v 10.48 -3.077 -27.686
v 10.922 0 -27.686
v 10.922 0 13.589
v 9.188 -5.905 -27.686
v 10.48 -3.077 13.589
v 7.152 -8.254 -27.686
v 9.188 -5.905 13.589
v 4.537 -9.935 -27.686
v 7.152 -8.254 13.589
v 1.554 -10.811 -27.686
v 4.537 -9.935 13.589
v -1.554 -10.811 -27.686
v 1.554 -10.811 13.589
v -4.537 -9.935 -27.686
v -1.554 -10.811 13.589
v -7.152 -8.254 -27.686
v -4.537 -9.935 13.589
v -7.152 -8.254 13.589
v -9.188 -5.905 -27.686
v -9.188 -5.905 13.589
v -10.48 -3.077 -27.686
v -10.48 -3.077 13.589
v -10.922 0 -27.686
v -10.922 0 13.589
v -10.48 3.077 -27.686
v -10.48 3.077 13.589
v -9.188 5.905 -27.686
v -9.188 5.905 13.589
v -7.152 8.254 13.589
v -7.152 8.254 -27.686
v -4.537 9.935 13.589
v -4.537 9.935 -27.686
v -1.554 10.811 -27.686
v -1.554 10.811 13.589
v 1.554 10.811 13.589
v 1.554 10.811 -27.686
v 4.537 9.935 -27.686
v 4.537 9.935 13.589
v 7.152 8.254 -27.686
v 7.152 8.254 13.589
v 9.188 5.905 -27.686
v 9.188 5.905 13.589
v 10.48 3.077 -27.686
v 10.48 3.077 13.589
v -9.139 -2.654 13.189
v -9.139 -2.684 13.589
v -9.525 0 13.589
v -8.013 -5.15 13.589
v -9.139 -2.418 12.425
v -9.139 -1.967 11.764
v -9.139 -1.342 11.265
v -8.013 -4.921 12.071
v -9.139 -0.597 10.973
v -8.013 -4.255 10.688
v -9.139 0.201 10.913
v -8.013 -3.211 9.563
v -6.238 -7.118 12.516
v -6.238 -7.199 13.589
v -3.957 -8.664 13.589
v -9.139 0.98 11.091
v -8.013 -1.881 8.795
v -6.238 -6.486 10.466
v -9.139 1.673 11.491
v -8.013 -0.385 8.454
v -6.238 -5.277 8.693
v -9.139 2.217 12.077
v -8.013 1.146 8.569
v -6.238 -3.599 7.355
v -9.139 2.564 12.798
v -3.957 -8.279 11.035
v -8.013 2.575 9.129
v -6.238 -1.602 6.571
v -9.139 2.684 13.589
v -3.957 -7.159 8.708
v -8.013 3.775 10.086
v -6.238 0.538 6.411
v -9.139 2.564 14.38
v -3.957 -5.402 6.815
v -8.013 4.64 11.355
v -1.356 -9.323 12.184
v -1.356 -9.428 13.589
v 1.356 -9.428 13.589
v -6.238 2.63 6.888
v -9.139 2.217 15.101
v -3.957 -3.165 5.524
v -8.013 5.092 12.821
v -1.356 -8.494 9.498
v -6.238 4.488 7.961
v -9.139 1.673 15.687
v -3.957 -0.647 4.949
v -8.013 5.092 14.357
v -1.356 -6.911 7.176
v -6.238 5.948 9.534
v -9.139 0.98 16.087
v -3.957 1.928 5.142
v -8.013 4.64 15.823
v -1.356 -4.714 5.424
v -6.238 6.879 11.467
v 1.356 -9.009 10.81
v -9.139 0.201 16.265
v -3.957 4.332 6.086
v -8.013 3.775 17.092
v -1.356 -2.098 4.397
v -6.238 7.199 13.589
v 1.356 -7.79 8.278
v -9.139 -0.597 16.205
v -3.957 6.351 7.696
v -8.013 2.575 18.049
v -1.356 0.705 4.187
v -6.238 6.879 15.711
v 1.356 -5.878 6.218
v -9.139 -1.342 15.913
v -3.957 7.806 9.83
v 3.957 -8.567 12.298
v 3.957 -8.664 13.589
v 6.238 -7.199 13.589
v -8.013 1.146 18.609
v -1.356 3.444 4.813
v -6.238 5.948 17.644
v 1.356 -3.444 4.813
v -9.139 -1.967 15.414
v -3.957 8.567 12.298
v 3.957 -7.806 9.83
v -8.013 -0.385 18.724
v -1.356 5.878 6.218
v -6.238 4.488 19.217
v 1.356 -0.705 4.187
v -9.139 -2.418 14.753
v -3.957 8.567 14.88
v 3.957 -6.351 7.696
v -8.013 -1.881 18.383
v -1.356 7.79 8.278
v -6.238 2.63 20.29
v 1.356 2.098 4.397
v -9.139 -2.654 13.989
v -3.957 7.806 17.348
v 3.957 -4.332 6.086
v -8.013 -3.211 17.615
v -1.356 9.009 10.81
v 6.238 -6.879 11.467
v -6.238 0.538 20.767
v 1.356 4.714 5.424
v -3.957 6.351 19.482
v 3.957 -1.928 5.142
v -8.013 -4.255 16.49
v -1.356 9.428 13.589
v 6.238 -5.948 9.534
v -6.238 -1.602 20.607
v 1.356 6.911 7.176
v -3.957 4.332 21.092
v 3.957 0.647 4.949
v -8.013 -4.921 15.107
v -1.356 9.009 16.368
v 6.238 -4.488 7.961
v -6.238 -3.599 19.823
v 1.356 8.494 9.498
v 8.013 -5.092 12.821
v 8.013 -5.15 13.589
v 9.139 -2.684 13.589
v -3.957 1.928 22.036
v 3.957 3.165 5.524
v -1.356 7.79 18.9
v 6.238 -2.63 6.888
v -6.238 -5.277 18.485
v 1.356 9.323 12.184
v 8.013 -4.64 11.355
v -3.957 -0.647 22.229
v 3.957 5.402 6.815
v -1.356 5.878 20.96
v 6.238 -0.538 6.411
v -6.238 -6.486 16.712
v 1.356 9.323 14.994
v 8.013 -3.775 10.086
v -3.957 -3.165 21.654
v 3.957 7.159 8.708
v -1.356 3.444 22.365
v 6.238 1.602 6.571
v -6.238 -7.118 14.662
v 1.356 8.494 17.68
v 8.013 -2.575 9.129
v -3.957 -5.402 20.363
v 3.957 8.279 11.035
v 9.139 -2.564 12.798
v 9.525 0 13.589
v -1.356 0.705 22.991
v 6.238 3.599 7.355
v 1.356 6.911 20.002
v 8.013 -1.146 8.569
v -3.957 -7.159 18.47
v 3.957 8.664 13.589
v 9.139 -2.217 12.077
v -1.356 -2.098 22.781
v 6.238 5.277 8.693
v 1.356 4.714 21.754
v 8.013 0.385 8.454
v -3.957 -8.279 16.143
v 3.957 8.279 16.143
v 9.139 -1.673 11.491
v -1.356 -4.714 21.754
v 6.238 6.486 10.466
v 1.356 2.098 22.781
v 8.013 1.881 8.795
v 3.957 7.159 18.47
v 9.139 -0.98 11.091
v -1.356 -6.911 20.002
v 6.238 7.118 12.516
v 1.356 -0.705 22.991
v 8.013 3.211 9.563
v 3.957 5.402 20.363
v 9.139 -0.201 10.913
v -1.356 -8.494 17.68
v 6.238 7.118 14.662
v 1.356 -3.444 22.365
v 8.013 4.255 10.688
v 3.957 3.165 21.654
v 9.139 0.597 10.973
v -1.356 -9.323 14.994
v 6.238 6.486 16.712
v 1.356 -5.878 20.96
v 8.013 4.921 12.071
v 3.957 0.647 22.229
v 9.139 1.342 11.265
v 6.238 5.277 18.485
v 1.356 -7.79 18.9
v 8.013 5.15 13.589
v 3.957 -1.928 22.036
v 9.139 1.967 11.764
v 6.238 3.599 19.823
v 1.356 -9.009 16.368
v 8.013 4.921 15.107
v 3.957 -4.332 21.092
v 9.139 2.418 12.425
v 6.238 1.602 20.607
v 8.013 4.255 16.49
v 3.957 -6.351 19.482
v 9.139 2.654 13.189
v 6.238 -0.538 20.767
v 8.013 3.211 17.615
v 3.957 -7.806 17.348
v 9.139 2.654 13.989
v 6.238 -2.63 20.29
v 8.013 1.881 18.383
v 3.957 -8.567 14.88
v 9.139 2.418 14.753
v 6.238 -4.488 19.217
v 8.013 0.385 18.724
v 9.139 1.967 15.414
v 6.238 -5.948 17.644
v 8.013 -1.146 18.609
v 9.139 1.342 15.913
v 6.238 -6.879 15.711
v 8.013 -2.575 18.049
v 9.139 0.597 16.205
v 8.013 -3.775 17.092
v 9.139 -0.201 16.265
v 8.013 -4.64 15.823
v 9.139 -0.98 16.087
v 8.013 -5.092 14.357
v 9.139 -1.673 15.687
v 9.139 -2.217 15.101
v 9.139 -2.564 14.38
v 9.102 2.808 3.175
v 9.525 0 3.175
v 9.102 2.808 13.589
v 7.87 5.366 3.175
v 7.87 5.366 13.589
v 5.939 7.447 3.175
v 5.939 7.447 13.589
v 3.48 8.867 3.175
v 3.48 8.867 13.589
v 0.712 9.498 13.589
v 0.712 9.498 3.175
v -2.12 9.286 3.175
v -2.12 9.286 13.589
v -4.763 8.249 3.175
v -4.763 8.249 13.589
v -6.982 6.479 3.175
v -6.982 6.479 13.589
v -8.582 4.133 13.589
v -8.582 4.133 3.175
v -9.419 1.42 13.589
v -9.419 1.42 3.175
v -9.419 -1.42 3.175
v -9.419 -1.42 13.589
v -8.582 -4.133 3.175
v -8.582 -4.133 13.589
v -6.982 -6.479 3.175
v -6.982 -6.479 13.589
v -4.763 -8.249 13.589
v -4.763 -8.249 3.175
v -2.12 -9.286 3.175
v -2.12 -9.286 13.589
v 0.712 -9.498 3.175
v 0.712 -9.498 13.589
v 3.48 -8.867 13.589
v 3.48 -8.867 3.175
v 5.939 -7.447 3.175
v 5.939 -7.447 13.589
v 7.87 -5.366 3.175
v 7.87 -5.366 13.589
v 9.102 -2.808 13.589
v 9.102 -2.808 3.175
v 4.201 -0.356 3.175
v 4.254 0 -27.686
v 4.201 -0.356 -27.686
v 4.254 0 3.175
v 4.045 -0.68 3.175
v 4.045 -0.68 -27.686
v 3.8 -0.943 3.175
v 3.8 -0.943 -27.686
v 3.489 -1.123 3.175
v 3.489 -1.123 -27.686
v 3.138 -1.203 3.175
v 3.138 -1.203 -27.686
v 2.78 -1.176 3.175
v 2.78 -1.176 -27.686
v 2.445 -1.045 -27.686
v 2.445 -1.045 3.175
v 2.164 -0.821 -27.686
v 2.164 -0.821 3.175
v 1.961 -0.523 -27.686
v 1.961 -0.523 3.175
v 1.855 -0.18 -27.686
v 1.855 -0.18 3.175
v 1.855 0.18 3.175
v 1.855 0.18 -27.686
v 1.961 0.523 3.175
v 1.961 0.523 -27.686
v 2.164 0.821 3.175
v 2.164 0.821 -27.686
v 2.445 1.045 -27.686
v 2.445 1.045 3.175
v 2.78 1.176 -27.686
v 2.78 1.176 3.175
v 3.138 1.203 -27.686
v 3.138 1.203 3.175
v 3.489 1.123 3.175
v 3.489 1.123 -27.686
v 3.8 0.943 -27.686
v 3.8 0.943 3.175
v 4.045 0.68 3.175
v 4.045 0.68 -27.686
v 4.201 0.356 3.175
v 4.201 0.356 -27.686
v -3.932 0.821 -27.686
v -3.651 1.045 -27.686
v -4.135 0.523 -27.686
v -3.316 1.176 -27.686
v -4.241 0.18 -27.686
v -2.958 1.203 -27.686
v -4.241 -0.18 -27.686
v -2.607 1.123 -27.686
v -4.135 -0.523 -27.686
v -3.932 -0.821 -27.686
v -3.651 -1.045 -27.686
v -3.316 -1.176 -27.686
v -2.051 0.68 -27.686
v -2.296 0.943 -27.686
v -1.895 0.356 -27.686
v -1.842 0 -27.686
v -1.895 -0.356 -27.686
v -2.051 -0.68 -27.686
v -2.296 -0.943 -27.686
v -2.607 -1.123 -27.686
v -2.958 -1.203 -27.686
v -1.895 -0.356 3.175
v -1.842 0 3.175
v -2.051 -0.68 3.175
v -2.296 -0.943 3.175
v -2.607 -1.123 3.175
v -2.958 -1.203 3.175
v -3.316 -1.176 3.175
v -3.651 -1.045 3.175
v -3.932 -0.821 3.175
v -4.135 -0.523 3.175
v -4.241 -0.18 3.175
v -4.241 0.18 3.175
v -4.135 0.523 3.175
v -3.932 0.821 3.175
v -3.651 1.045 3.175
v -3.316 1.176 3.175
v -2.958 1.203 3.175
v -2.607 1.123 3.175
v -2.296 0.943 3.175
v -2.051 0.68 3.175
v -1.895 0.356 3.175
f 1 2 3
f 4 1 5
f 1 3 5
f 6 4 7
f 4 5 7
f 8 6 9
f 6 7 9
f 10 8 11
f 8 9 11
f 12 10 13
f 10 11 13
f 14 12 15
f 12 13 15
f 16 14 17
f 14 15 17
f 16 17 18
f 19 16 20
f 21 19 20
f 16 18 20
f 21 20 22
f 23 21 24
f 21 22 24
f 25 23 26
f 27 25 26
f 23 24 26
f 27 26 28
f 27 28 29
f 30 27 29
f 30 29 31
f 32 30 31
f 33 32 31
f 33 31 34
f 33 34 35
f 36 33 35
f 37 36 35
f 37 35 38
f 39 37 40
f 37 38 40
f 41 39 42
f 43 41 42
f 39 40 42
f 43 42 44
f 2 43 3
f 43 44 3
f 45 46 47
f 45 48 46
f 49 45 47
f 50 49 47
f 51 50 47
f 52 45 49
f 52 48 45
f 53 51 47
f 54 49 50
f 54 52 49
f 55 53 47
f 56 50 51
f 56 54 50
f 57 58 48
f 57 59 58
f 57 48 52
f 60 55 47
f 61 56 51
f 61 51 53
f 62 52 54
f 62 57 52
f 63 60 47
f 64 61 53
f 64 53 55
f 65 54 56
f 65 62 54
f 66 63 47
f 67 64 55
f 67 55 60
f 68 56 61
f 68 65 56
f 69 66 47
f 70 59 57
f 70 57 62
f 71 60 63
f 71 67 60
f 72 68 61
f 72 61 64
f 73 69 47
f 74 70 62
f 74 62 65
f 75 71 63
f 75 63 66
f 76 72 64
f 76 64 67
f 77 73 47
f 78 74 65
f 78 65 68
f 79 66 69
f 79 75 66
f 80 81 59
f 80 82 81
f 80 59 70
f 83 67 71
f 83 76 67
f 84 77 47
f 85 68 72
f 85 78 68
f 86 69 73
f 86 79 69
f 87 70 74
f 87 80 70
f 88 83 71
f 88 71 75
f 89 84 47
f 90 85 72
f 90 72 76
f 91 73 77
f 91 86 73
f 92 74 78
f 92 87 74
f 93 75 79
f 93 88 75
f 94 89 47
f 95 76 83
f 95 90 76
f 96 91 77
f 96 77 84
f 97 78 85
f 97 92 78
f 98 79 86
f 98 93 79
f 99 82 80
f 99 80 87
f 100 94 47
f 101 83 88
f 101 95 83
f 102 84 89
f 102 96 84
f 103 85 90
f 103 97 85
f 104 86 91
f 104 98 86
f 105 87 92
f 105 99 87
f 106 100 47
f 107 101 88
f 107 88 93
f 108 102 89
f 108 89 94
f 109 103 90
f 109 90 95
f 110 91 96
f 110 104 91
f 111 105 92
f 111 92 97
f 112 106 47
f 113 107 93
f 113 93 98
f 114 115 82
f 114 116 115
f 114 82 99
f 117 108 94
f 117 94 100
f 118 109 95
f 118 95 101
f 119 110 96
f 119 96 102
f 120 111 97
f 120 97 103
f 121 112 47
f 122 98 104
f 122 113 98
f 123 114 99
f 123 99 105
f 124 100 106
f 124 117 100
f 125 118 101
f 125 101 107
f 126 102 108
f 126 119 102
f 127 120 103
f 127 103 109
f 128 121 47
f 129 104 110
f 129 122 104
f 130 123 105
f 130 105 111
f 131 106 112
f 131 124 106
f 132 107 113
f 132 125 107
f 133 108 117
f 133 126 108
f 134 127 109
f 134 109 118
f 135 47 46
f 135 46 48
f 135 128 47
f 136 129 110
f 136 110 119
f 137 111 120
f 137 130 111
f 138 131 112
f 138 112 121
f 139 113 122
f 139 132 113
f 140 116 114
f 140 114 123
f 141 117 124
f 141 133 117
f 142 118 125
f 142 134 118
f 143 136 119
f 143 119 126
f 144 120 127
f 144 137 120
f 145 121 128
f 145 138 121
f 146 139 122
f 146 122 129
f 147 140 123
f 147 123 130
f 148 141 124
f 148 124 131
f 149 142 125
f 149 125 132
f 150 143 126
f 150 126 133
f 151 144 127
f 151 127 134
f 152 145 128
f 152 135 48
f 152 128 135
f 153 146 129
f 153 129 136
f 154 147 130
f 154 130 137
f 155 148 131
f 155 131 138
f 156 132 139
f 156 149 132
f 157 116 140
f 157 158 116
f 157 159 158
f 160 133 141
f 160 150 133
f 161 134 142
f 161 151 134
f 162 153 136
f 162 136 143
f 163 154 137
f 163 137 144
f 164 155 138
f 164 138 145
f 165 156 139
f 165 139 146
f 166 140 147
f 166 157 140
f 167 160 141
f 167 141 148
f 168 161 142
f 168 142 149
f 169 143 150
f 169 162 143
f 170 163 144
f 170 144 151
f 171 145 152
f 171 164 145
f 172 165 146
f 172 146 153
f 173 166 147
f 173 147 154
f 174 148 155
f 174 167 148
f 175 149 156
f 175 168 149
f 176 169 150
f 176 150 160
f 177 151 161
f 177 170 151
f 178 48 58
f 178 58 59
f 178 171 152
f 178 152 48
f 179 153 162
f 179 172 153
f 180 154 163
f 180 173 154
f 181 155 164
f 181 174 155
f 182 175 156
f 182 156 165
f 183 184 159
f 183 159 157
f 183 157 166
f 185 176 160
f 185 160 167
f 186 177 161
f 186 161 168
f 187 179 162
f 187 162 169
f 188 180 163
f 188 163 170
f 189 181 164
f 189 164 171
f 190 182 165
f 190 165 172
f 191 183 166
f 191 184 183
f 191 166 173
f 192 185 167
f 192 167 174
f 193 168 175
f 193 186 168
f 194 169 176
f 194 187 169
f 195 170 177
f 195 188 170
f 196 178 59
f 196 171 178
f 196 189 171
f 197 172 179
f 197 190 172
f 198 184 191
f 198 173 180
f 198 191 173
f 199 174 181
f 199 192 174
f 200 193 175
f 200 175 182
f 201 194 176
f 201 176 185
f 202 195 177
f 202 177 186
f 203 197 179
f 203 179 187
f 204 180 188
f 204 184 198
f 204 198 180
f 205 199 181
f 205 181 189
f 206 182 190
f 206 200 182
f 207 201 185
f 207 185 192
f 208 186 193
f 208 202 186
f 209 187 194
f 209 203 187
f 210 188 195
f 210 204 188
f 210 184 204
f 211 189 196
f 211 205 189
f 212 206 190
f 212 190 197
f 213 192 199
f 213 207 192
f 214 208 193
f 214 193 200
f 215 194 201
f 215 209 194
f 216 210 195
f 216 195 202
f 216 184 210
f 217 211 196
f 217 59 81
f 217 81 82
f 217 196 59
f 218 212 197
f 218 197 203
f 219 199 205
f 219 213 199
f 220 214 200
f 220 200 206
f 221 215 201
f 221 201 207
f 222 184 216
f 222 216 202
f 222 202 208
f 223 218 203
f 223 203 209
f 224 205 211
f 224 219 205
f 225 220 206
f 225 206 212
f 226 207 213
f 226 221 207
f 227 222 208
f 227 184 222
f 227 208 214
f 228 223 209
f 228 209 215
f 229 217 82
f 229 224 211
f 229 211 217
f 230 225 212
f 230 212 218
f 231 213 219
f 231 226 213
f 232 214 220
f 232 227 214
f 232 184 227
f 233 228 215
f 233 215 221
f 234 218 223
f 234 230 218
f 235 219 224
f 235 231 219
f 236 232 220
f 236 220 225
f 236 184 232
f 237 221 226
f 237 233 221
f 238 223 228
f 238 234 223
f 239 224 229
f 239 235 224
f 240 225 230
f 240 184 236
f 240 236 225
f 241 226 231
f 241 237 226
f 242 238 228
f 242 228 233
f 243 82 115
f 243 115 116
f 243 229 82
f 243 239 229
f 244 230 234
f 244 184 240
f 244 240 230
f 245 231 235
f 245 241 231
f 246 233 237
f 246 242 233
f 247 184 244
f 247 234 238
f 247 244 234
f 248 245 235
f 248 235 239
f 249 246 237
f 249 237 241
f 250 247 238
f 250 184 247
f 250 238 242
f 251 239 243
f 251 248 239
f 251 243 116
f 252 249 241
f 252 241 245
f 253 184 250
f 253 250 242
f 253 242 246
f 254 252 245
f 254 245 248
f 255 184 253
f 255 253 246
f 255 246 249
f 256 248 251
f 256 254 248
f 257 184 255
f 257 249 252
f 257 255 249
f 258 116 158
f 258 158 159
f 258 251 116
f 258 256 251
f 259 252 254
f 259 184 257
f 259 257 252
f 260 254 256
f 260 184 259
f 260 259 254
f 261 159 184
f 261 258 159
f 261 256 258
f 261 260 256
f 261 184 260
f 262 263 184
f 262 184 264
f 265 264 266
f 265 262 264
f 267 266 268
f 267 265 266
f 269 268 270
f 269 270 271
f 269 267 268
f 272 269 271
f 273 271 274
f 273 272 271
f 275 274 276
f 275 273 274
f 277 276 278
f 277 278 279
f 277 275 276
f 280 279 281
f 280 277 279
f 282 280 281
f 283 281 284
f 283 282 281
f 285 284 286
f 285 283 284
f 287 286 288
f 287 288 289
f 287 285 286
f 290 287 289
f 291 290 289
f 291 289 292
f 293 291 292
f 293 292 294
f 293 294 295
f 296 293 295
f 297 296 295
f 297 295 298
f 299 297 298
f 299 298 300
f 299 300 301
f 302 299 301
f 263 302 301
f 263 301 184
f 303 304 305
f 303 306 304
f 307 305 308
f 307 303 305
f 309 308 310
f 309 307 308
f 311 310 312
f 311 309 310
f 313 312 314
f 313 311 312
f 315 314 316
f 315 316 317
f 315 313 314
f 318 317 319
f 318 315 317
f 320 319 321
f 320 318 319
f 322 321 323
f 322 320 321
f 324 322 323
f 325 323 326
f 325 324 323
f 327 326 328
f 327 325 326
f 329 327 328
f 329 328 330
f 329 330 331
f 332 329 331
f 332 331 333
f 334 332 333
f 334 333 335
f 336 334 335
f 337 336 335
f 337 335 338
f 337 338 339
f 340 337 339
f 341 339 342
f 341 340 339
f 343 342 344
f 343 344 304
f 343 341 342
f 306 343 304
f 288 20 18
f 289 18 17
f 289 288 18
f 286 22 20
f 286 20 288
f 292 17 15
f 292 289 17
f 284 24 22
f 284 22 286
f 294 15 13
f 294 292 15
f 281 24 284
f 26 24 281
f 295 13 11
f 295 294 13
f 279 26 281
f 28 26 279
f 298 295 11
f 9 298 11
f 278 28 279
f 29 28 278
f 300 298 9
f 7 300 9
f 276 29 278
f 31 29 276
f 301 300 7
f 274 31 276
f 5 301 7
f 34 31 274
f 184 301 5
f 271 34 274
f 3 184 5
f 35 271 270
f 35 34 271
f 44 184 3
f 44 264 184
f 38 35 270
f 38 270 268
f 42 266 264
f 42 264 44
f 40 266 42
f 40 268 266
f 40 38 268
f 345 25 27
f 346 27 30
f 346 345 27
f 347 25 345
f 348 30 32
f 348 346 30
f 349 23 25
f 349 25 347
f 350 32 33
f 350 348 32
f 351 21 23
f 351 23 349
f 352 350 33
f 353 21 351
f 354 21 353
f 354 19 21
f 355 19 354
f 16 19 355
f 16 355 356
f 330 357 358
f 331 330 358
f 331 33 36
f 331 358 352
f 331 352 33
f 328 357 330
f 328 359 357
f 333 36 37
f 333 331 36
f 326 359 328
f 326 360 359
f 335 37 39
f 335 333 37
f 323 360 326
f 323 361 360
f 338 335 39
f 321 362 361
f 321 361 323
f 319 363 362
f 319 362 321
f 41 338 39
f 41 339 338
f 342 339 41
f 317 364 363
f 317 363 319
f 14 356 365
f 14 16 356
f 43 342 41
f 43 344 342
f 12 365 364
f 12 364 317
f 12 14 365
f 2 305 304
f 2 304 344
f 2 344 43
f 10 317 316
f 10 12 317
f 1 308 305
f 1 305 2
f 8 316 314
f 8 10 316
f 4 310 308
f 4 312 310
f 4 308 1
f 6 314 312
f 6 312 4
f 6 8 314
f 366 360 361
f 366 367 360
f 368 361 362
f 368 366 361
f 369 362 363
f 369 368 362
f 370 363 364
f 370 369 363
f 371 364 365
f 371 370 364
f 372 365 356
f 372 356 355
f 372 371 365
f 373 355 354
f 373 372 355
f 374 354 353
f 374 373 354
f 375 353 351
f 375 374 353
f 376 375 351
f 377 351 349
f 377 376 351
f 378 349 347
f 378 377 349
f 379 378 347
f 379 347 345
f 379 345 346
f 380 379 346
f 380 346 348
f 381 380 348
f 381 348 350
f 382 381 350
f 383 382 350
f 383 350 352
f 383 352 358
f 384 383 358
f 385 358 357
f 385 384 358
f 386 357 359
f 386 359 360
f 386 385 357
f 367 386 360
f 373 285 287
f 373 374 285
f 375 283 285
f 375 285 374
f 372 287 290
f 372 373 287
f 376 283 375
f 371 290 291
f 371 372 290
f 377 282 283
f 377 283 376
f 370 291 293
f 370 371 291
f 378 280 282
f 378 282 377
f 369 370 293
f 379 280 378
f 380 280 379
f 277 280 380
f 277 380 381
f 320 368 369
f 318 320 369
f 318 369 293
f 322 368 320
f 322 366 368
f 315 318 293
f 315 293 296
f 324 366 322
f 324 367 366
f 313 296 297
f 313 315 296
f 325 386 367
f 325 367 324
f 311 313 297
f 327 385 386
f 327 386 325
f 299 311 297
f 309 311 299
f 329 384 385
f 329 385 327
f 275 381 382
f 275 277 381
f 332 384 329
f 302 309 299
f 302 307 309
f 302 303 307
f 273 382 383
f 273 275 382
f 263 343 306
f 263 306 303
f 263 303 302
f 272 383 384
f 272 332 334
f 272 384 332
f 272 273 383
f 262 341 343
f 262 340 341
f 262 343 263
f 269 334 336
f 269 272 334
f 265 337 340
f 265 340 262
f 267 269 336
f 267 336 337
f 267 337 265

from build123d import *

# Parameters (mm, degrees)
F0_R        = 10.922
F0_R_2      = 9.525
F1_DEPTH    = 13.589
F4_R        = 9.525
F4_R_2      = 1.2065
F5_DEPTH    = 3.175
F5_FACE_R   = 10.922
F5_FACE_R_2 = 1.2065
F6_DEPTH    = 27.686


with BuildPart() as f1:
    # F0 (on Top) → F1 (new body)
    with BuildSketch(Plane.XY):
        Circle(F0_R)
        Circle(F0_R_2, mode=Mode.SUBTRACT)
    extrude(amount=F1_DEPTH)

    # F4 (on Top) → F5 (join)
    with BuildSketch(Plane.XY):
        Circle(F4_R)
        with Locations((-3.048, 0)):
            Circle(F4_R_2, mode=Mode.SUBTRACT)
        with Locations((3.048, 0)):
            Circle(F4_R_2, mode=Mode.SUBTRACT)
    extrude(amount=F5_DEPTH)

    # F5_face (on face) → F6 (join)
    with BuildSketch(Plane(origin=(0, 0, 0), x_dir=(1, 0, 0), z_dir=(0, 0, -1))):
        Circle(F5_FACE_R)
        with Locations((3.048, 0)):
            Circle(F5_FACE_R_2, mode=Mode.SUBTRACT)
        with Locations((-3.048, 0)):
            Circle(F5_FACE_R_2, mode=Mode.SUBTRACT)
    extrude(amount=F6_DEPTH)


with BuildPart() as f3:
    # F2 (on face) → F3 (revolve)
    with BuildSketch(Plane.XY.offset(13.589)):
        with BuildLine():
            Line((9.525, 0), (-9.525, 0))
            ThreePointArc((-9.525, 0), (0, -9.525), (9.525, 0))
        make_face()
    revolve(axis=Axis((7.46786, 0, 13.589), (1, 0, 0)))


solid = Compound([f1.part, f3.part])
